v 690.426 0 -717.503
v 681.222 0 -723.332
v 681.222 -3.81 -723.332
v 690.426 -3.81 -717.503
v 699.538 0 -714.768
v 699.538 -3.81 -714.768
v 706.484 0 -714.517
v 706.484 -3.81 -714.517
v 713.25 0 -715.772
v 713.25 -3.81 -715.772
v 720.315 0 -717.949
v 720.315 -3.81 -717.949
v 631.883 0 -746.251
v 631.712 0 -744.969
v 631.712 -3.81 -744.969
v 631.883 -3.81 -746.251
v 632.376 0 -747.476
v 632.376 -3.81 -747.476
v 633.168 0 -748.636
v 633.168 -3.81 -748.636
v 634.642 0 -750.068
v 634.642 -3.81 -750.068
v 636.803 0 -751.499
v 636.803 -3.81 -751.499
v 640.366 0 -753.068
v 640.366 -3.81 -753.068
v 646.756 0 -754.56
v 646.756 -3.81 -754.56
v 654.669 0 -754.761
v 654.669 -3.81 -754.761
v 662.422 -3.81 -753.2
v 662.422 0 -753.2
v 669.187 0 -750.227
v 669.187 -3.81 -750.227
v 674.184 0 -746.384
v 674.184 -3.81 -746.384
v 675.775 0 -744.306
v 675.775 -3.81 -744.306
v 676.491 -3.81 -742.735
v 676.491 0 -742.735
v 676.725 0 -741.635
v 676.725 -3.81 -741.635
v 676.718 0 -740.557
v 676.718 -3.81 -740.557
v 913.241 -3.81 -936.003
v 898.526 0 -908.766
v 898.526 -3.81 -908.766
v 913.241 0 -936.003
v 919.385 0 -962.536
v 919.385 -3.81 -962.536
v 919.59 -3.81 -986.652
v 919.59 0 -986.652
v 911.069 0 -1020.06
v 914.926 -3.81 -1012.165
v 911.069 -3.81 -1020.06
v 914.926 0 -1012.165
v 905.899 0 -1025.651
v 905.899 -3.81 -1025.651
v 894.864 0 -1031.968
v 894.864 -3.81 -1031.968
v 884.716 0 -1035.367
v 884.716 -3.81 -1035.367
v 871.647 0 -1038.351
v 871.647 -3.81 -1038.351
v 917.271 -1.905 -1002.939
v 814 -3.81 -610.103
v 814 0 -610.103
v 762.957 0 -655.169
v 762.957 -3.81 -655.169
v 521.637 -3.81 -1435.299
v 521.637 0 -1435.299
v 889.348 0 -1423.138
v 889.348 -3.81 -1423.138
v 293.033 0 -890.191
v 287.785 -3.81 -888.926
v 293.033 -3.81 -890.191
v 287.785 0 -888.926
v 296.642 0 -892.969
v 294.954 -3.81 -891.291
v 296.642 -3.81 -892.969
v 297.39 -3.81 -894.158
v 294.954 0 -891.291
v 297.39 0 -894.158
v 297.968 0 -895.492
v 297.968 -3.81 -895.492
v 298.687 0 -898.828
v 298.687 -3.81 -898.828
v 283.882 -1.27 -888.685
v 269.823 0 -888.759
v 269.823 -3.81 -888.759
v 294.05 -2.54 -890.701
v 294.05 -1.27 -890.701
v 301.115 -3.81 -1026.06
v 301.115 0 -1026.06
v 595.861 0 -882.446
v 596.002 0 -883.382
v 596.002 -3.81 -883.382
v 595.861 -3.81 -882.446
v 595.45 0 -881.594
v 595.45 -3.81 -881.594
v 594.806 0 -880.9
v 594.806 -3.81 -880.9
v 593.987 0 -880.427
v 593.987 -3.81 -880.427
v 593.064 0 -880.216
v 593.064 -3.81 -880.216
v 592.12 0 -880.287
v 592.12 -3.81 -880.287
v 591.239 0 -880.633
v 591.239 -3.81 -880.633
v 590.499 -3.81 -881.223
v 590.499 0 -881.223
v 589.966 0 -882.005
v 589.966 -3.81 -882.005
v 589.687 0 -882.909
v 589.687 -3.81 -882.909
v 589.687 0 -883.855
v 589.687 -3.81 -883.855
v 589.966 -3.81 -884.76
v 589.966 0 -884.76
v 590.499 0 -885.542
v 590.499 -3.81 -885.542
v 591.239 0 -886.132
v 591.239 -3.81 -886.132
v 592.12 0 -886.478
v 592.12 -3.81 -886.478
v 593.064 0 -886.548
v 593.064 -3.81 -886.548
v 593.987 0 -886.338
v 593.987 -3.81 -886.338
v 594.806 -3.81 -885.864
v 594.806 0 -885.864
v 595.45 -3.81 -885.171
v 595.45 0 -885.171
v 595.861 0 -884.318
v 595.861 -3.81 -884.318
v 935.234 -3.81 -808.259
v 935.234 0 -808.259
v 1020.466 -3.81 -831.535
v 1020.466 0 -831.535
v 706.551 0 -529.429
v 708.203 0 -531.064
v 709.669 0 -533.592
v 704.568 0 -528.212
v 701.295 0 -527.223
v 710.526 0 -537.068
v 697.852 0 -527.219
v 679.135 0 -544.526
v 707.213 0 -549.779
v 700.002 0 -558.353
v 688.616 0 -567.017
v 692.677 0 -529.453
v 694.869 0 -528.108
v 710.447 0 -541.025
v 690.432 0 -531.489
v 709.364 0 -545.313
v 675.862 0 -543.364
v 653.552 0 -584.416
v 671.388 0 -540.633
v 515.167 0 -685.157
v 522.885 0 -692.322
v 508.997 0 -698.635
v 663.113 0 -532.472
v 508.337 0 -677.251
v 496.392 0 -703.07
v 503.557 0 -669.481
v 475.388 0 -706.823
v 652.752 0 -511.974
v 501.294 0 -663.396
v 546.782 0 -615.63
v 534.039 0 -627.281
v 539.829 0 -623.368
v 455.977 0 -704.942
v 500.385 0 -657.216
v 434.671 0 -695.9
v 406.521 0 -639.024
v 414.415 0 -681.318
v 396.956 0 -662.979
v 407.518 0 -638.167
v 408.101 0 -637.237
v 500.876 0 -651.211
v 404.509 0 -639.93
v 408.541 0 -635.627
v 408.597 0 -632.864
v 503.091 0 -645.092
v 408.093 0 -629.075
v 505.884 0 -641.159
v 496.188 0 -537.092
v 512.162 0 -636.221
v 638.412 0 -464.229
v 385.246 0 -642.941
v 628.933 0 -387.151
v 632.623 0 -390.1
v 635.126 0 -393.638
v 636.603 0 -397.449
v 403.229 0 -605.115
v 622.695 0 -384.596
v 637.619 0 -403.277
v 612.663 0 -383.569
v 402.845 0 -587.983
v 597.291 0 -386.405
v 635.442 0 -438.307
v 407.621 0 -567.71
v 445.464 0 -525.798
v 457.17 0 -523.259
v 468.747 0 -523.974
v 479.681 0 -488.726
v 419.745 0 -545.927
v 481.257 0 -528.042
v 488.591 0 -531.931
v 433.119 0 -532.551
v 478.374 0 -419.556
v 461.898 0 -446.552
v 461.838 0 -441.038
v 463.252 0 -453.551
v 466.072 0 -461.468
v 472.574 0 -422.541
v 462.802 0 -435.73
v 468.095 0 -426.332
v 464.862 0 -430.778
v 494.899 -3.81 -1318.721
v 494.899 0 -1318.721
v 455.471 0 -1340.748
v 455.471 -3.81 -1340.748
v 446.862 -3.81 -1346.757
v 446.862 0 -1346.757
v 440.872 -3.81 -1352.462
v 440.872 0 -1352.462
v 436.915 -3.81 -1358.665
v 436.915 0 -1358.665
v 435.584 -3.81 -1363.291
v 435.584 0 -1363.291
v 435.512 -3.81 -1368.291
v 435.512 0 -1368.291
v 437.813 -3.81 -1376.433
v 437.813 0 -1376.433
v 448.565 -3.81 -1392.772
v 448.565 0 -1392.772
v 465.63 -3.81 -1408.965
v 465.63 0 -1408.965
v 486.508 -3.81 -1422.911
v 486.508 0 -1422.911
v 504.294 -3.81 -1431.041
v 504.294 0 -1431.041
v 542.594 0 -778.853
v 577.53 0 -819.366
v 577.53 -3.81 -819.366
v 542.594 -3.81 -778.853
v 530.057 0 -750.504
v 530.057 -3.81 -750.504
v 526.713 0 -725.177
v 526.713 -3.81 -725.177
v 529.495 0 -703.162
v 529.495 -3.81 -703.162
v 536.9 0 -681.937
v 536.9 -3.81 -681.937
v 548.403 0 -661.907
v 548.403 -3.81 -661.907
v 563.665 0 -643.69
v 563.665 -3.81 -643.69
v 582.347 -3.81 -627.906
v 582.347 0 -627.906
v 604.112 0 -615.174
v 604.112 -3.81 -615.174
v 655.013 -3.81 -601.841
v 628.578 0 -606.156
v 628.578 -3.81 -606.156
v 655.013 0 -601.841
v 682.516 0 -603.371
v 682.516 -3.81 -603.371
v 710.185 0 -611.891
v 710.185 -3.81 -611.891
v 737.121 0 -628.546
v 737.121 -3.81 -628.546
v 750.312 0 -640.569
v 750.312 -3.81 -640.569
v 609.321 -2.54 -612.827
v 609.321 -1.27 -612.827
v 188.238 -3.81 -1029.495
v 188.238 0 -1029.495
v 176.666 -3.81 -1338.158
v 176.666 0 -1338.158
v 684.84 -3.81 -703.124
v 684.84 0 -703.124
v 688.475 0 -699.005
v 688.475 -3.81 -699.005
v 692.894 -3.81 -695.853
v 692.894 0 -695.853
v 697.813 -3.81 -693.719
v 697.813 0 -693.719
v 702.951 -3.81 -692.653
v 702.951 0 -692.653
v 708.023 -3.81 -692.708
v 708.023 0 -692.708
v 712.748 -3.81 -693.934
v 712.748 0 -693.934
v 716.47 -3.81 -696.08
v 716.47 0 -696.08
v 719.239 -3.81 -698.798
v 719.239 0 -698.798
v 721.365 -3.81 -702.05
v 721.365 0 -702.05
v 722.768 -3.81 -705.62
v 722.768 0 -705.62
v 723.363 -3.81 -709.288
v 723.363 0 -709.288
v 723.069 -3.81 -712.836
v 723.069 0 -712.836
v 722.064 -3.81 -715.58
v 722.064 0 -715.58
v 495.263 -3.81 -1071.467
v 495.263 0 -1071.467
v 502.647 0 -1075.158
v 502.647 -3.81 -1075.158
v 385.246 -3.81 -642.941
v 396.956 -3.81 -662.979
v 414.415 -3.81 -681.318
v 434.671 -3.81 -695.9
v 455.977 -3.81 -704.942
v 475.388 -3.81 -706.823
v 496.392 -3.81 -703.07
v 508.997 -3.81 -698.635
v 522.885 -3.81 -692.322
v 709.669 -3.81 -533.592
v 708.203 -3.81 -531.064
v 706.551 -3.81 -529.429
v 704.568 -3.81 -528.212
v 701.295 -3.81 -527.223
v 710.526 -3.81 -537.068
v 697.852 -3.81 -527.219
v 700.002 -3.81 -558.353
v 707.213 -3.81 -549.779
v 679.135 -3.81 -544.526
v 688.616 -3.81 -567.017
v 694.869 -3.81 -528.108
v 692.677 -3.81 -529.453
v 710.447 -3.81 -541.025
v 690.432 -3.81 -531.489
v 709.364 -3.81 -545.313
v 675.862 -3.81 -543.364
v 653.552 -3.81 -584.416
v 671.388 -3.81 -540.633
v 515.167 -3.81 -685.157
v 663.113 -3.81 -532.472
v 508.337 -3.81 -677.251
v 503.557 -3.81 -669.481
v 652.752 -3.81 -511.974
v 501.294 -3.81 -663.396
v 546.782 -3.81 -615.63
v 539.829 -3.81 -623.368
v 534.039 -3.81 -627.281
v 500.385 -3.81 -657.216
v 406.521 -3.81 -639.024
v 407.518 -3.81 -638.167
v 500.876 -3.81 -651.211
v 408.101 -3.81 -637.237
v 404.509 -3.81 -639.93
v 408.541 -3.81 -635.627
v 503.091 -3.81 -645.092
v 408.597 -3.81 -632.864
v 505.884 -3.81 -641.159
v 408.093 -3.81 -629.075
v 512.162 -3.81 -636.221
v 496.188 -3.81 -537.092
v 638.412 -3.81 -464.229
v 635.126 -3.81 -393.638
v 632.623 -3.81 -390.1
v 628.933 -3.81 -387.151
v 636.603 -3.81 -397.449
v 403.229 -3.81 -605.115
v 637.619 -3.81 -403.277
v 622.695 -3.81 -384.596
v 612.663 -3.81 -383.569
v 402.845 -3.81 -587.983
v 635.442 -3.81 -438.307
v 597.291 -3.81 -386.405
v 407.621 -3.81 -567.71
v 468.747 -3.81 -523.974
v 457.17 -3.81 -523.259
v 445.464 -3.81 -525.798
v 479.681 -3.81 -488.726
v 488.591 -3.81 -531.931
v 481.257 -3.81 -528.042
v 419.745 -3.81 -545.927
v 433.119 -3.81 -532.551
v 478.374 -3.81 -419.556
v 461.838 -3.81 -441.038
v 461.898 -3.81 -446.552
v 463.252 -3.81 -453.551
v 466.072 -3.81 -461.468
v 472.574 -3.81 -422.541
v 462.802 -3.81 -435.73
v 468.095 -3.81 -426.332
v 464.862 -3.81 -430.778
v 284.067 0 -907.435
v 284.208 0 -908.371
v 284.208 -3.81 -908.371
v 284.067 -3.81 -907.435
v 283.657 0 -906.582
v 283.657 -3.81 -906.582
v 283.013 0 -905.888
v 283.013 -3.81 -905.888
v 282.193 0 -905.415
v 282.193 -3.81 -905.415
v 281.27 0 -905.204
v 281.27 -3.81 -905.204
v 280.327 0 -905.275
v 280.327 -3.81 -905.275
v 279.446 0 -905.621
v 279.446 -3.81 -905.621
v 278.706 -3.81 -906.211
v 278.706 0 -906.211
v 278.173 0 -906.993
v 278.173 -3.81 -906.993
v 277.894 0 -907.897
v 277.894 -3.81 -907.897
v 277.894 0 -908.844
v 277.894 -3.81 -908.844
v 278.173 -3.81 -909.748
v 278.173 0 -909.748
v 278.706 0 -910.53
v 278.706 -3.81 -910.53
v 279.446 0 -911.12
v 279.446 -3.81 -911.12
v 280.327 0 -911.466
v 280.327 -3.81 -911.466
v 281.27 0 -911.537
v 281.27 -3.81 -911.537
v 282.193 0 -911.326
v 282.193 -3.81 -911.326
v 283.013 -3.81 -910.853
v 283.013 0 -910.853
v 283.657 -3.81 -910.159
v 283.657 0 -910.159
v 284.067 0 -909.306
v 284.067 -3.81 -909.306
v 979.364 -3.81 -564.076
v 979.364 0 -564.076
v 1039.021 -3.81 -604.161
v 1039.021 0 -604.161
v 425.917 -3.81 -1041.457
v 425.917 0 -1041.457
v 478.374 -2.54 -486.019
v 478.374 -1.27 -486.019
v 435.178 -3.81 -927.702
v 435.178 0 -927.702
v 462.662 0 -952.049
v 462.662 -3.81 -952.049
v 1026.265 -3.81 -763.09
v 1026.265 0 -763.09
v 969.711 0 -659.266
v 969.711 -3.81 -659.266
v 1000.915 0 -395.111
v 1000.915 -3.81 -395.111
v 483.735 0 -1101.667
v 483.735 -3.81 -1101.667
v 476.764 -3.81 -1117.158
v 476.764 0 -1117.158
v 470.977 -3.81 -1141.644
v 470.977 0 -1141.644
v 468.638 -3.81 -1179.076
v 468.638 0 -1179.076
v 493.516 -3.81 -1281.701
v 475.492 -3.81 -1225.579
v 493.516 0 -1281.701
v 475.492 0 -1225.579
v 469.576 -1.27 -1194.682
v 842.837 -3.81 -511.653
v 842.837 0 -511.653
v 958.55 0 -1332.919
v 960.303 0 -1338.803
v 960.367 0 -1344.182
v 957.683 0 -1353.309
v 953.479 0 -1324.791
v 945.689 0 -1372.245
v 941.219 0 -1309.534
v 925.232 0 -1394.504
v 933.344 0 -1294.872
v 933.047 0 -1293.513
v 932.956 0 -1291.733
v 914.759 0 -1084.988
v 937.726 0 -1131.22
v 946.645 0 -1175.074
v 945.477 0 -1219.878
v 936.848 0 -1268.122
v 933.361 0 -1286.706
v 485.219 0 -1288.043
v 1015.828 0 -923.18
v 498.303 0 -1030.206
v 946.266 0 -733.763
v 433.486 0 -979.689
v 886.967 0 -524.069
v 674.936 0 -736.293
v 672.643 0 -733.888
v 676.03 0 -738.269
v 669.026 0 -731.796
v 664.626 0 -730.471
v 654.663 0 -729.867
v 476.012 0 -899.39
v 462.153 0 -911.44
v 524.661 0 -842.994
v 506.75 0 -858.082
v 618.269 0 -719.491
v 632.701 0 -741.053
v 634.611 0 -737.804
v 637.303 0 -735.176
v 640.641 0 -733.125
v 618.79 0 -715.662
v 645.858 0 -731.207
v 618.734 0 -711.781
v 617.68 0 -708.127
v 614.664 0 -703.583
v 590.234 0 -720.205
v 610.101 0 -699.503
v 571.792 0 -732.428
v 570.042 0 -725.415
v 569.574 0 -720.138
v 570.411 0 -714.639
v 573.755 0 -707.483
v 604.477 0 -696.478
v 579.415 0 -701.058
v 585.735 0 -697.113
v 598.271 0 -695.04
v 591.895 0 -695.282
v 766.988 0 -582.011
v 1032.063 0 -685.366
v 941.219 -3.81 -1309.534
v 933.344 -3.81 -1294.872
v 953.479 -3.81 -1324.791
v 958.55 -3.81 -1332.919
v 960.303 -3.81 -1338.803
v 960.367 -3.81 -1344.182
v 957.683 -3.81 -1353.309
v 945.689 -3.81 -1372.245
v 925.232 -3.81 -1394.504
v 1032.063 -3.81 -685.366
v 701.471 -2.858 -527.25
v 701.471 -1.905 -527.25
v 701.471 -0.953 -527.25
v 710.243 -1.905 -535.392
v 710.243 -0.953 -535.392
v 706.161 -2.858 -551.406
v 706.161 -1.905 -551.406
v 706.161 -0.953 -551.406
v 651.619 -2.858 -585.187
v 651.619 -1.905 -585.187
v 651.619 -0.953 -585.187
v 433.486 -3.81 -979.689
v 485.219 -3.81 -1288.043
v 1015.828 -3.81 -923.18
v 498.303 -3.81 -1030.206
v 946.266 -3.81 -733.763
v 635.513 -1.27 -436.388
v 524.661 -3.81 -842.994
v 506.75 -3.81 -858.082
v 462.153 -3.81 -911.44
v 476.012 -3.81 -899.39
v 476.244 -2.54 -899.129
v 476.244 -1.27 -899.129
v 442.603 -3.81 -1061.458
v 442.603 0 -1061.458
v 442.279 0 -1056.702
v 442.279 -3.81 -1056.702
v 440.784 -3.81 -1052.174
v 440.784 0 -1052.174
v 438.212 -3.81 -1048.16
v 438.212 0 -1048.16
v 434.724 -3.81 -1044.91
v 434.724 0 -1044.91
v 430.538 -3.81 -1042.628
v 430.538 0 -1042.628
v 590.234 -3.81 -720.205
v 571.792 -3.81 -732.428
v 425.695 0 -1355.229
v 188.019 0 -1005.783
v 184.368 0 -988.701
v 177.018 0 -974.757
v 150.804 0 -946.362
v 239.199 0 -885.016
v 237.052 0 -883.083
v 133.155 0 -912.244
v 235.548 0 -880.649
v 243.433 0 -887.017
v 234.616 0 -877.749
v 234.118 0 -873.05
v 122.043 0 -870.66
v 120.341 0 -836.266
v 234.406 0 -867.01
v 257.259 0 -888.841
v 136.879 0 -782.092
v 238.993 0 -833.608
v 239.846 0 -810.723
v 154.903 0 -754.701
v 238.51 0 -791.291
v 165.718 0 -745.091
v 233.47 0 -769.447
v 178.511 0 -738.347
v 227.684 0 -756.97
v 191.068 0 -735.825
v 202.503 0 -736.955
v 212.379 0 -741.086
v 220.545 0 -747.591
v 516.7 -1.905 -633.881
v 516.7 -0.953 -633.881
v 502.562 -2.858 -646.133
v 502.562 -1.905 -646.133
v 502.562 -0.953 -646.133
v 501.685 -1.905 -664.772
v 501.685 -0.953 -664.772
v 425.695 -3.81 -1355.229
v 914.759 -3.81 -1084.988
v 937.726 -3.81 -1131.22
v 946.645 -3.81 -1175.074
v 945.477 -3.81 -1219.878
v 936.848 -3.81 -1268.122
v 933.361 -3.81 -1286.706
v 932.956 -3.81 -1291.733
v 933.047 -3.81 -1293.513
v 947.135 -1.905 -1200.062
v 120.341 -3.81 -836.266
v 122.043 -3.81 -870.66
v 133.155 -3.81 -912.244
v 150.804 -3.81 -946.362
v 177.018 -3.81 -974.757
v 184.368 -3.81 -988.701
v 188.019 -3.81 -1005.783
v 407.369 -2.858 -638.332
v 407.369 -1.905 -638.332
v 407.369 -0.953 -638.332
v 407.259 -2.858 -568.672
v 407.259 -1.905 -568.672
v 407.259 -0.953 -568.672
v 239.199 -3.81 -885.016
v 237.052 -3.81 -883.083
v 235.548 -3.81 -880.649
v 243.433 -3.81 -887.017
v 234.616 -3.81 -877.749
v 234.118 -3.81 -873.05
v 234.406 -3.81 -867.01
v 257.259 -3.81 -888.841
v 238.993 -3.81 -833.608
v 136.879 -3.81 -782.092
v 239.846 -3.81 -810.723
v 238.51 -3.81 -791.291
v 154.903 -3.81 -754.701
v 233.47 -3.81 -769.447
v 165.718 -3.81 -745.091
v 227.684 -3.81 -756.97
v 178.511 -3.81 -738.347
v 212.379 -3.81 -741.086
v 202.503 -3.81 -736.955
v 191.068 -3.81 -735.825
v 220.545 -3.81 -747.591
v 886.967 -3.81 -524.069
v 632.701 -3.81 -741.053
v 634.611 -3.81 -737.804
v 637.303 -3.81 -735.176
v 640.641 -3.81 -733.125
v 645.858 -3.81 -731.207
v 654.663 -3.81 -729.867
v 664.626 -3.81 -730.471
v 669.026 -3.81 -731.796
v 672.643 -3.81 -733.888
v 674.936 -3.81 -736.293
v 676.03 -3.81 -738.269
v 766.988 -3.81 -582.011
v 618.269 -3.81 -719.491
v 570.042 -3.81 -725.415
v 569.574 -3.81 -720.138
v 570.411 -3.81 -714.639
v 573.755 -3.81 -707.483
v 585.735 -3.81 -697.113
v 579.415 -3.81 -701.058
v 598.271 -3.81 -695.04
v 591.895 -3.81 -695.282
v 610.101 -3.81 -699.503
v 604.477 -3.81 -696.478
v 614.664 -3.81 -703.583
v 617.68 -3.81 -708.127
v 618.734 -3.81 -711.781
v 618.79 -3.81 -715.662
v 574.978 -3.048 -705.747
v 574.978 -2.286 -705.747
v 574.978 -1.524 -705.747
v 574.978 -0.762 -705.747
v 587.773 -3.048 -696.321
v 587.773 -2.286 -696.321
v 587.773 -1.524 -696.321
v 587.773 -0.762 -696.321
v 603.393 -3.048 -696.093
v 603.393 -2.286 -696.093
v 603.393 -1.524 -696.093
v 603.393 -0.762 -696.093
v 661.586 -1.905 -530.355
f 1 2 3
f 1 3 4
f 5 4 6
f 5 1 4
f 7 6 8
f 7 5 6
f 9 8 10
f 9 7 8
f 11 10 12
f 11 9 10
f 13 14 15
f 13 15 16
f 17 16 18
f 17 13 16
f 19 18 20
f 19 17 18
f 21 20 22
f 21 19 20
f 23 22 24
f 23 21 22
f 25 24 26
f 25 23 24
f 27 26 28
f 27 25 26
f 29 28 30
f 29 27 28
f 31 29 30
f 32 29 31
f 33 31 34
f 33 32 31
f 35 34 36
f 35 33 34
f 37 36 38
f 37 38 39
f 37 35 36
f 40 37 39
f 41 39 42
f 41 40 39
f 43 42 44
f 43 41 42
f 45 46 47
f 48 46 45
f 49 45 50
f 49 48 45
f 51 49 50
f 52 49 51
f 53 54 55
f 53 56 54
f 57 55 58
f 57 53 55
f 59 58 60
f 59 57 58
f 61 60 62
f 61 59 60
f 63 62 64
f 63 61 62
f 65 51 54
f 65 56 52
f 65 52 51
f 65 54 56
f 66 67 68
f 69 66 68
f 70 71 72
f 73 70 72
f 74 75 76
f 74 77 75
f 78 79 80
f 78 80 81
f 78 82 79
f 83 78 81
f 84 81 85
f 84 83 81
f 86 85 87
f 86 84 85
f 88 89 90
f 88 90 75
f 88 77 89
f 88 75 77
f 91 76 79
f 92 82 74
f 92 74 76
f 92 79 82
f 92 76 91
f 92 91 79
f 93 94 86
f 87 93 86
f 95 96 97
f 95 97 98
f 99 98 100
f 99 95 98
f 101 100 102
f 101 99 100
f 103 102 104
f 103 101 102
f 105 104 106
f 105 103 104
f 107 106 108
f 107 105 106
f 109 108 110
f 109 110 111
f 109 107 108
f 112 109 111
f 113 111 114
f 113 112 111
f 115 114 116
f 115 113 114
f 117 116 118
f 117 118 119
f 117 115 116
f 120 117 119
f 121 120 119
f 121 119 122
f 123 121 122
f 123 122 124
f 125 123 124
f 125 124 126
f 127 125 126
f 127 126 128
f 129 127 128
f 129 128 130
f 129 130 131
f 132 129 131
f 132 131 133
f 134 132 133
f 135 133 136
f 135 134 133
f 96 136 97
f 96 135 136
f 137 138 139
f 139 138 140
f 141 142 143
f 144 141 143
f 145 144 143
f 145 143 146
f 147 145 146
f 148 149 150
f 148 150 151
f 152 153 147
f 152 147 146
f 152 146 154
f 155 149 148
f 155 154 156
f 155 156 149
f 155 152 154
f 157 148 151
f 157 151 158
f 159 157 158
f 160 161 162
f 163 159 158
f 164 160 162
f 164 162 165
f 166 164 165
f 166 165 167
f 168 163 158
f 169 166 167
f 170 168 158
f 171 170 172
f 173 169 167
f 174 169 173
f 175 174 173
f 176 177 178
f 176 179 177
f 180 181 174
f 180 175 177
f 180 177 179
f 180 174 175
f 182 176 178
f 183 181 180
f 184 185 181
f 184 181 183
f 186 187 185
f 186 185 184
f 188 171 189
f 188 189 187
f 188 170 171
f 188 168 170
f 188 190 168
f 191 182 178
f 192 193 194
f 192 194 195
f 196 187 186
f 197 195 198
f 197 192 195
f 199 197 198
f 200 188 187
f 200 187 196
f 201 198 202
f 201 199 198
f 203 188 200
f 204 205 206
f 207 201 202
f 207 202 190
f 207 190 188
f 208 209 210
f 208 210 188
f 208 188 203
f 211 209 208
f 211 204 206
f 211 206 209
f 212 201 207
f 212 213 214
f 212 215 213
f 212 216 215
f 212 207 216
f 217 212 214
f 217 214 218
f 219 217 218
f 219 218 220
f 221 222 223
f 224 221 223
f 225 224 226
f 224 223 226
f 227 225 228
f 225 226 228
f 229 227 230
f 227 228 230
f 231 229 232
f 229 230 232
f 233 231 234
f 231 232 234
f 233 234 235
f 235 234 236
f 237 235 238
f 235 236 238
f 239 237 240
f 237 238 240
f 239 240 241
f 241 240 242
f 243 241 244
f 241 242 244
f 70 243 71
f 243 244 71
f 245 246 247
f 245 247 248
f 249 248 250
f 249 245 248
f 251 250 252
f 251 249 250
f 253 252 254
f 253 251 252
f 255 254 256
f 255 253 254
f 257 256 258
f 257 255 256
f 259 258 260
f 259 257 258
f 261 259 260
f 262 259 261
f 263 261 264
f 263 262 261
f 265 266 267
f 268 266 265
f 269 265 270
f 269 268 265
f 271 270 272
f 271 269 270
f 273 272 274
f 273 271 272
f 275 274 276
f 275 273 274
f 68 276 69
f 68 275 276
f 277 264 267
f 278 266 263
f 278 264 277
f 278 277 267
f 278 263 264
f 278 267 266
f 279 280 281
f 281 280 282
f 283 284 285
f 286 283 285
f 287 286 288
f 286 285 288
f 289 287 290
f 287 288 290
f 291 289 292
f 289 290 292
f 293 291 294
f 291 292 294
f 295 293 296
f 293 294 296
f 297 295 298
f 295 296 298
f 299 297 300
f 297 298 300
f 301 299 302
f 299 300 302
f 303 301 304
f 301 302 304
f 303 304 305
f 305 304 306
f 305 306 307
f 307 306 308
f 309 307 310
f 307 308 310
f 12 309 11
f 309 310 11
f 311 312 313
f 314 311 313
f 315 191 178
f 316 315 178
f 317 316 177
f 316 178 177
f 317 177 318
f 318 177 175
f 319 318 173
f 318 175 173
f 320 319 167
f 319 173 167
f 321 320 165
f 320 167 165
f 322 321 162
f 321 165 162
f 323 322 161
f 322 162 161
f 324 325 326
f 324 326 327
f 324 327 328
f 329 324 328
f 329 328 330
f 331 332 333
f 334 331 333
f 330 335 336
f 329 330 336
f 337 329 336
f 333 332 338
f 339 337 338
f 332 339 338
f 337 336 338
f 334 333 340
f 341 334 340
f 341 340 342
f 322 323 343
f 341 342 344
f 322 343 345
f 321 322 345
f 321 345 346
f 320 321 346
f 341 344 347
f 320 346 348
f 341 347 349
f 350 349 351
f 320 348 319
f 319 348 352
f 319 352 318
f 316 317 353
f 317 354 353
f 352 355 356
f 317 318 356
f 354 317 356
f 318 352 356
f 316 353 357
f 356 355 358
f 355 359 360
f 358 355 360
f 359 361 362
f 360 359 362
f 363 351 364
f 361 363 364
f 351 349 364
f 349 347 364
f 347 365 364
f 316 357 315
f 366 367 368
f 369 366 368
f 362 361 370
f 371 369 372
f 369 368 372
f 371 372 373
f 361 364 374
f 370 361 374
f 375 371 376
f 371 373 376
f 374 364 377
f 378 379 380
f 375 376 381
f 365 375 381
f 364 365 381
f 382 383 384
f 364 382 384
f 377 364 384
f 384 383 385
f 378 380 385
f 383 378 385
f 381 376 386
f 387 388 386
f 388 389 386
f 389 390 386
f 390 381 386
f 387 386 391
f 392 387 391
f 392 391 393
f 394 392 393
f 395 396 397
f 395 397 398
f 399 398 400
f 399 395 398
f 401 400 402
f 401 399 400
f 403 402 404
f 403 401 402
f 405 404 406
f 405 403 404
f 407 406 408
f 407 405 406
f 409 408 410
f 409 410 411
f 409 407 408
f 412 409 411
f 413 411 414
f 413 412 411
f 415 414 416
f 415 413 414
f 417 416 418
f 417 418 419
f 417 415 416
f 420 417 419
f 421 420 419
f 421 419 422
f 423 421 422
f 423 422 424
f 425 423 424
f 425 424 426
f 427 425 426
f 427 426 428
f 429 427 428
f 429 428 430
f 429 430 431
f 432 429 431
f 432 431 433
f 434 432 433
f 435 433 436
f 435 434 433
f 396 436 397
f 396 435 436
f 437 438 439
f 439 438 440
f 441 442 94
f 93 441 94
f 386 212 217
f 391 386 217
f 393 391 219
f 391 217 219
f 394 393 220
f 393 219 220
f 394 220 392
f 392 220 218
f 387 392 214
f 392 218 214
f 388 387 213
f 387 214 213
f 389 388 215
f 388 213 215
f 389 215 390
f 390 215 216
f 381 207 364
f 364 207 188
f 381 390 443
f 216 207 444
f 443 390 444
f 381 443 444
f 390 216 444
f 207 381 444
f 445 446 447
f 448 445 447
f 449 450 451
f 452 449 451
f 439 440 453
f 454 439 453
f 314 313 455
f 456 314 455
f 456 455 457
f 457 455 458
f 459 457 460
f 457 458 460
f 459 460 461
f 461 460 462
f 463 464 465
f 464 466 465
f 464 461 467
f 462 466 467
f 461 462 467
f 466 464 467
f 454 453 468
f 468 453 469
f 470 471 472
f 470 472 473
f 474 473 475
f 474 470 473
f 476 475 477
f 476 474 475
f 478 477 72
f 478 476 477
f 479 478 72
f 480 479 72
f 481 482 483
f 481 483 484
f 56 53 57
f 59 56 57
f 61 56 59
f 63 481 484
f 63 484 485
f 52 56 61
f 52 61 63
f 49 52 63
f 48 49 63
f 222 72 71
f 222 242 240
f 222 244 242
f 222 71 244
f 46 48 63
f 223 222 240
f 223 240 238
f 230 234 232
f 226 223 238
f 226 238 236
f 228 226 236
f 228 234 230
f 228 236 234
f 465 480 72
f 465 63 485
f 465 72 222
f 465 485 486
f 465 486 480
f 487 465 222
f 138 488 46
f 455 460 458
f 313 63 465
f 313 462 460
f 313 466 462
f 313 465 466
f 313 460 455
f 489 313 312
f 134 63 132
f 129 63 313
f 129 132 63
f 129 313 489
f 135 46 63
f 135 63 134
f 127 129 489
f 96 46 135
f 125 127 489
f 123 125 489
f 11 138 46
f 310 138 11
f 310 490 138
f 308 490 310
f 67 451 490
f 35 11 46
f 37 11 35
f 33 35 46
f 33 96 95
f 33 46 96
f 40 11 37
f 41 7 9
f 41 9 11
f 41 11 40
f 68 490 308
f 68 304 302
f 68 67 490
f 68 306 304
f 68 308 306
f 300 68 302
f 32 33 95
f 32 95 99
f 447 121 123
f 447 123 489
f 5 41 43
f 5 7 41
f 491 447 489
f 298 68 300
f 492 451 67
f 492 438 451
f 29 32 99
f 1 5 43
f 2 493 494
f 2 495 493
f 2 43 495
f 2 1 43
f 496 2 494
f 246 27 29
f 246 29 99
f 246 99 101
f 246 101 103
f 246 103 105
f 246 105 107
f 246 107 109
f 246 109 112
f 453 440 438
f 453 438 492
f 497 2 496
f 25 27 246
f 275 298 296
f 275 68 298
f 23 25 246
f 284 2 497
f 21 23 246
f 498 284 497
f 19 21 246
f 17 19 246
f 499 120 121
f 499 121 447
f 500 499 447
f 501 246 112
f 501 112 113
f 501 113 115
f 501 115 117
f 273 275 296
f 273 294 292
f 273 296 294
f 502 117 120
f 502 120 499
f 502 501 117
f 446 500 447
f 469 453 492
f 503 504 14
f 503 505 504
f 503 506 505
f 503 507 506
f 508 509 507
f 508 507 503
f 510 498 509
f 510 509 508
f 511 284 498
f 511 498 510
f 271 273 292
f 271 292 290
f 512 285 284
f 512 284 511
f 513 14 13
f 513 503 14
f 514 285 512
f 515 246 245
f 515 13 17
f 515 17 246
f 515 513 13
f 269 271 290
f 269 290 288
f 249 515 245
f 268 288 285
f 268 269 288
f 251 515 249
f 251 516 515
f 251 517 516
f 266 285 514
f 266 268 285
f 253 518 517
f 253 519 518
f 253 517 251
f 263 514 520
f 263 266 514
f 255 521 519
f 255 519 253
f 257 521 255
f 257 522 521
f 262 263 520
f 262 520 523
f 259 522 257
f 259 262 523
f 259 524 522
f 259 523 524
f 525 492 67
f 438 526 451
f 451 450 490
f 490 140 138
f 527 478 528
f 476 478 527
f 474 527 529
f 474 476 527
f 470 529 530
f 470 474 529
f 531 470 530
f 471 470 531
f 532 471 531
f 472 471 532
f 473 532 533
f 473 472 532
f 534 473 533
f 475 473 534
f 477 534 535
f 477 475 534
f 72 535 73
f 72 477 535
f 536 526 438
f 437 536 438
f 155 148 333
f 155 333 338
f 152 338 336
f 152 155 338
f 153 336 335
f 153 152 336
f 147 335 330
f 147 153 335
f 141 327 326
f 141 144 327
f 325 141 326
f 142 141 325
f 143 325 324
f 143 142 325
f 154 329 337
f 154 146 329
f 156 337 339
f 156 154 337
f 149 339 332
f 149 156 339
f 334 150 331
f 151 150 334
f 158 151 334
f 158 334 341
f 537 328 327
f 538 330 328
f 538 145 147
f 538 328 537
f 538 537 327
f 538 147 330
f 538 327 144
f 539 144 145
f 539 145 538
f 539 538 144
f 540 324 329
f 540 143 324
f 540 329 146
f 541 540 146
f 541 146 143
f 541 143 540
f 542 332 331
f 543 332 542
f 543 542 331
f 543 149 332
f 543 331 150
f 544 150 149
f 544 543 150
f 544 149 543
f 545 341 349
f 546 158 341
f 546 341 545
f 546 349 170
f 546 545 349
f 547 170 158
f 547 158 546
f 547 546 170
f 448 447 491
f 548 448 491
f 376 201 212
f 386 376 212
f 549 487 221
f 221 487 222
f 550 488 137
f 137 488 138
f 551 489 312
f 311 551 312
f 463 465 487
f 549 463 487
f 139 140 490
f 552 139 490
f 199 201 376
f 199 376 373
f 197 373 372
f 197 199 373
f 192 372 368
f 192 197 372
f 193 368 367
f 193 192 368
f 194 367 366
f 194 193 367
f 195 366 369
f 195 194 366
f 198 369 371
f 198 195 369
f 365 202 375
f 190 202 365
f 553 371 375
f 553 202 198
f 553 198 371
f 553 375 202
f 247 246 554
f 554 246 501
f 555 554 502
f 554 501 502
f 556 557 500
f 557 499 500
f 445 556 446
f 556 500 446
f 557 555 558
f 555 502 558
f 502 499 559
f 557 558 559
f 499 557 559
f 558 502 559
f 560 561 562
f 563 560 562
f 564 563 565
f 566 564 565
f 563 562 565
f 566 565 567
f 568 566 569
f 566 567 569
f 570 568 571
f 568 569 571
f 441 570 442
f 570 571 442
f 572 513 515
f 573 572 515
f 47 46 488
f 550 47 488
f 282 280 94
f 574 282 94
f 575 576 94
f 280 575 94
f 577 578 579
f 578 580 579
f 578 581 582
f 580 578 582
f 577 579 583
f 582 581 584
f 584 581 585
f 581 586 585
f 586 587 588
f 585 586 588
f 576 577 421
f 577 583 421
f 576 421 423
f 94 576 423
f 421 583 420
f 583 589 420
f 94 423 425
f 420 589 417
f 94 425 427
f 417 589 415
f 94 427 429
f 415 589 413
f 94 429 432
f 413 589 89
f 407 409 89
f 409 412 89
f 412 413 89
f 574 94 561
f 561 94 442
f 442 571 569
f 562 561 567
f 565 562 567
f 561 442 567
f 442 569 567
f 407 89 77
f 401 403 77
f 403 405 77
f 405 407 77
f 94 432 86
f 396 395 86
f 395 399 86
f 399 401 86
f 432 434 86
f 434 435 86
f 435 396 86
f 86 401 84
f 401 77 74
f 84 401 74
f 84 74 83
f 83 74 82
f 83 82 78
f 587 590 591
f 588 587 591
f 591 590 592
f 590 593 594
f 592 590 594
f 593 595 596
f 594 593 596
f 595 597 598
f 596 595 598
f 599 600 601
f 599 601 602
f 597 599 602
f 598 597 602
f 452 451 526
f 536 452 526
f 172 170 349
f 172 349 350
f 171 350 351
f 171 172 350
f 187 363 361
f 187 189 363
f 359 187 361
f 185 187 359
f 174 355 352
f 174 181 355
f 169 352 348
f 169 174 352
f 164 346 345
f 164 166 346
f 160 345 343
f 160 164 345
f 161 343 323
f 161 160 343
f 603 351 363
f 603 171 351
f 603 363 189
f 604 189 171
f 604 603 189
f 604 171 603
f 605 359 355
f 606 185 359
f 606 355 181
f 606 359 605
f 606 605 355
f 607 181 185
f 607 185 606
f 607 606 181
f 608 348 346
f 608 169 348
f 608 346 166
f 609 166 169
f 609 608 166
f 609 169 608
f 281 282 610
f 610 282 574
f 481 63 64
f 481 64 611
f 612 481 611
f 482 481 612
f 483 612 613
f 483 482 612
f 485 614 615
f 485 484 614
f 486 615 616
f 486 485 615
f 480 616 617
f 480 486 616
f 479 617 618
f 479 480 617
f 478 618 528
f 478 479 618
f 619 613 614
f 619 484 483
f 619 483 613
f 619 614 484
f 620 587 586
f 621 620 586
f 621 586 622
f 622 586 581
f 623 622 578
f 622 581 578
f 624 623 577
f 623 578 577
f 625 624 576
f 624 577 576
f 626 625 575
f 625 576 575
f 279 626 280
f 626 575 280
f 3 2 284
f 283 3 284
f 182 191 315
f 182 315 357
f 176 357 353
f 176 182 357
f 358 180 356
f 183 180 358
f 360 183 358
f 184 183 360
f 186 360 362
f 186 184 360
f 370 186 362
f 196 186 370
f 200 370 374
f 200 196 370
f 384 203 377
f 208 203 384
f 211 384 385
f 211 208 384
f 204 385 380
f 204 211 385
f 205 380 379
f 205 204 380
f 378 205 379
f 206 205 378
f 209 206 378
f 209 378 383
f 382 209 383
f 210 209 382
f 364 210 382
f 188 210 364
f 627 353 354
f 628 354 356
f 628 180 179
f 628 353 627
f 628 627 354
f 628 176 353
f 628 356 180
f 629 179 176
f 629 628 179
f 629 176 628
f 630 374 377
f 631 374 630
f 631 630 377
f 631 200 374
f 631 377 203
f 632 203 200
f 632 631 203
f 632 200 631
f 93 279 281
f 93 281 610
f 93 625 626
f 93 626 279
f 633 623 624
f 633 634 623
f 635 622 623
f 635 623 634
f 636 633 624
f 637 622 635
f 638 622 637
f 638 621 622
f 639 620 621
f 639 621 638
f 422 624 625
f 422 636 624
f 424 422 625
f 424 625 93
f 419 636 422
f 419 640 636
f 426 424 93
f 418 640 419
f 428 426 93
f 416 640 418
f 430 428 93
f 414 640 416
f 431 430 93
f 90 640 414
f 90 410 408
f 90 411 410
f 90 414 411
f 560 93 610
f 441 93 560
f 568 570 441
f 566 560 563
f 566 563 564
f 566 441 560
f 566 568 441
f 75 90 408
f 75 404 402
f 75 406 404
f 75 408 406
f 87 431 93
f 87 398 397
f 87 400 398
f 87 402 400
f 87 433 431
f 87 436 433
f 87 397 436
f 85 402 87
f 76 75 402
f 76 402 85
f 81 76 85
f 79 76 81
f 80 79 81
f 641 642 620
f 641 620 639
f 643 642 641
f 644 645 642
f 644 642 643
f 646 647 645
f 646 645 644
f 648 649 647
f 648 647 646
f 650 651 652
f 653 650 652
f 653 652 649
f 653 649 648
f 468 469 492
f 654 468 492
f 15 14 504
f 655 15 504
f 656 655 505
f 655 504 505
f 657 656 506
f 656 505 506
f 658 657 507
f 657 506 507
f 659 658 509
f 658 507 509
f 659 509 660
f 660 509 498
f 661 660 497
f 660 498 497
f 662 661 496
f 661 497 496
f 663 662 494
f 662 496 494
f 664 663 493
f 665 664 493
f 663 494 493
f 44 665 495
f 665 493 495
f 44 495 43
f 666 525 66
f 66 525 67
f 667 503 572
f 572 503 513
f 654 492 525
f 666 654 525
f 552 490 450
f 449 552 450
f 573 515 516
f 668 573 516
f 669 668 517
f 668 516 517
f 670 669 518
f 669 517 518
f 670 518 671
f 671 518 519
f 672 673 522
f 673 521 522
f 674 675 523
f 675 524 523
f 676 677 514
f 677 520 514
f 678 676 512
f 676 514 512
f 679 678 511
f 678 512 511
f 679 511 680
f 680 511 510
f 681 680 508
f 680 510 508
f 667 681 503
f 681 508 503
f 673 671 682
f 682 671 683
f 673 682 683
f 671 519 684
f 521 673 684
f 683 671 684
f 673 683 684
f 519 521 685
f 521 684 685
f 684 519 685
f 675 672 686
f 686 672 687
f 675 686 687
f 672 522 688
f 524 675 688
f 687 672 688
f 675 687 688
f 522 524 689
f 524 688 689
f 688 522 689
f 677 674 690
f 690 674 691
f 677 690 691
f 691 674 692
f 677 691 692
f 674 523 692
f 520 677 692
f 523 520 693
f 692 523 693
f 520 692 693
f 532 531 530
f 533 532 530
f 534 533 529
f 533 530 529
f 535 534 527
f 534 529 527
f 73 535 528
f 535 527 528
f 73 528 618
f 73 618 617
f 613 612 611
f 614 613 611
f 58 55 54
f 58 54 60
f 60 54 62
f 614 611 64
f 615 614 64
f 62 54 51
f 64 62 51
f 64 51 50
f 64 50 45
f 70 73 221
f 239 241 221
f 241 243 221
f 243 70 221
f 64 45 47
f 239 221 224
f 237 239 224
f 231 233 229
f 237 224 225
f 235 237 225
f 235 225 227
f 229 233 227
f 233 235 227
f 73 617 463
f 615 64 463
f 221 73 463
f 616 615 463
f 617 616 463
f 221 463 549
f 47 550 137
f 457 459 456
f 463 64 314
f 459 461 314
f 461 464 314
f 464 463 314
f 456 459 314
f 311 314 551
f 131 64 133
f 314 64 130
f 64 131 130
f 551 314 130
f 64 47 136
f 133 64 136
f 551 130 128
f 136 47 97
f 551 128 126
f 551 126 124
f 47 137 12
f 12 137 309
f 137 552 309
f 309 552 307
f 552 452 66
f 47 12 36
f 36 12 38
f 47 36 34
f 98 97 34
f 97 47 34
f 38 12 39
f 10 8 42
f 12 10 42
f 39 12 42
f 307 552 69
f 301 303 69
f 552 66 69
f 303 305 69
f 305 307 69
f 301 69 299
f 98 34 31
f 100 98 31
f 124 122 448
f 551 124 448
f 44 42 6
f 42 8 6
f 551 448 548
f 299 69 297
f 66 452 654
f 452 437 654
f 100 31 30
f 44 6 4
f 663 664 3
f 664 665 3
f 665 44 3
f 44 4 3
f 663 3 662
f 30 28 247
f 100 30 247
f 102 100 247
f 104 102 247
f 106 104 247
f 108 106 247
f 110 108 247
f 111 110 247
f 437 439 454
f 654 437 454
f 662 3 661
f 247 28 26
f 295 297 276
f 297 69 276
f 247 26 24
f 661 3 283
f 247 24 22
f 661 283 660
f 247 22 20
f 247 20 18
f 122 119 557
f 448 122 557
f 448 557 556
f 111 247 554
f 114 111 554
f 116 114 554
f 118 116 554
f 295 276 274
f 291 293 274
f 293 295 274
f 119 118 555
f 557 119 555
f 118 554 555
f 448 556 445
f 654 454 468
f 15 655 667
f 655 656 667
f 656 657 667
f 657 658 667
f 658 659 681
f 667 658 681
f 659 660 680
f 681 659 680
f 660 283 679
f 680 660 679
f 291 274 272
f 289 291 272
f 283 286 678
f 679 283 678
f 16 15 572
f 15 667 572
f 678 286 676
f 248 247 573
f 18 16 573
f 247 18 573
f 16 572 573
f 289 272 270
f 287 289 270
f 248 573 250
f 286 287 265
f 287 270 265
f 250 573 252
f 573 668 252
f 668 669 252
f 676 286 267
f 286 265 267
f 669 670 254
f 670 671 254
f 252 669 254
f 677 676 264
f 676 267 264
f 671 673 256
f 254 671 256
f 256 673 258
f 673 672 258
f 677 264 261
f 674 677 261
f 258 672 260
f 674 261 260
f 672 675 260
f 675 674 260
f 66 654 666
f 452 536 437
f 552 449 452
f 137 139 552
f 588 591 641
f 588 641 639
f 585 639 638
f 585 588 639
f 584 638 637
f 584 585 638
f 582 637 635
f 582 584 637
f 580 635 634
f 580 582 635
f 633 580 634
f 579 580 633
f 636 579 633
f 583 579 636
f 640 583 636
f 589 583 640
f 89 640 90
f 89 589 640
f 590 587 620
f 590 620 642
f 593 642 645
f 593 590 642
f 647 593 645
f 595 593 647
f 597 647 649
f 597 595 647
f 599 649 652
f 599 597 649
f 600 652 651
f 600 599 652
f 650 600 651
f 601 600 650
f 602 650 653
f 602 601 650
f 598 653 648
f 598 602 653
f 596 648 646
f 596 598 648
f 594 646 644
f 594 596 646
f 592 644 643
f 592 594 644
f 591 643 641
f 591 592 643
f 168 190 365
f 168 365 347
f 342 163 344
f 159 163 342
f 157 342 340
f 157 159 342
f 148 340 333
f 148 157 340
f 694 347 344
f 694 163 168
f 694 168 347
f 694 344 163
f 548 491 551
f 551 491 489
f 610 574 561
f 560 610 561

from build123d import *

# Parameters (mm, degrees)
F0_R     = 3.175
F1_DEPTH = 3.81
F2_DEPTH = 3.81
F3_DEPTH = 3.81


with BuildPart() as f1:
    # F0 (on Front) → F1 (new body)
    with BuildSketch(Plane.XZ):
        with BuildLine():
            add(Edge.make_bspline(
                [(577.5301456451, -819.3663954735), (528.1828455236, -775.2097354619), (511.8682646711, -695.7693412774), (603.6466815031, -591.7203471431), (716.3102957828, -594.8701009791), (762.9569310114, -655.1693814075)],
                knots=[0, 0, 0, 0, 0.3293668885, 0.637001862, 1, 1, 1, 1], degree=3))
            add(Edge.make_bspline(
                [(577.5301456451, -819.3663954735), (548.4415590763, -828.8691043854), (505.7238427203, -848.2158835695), (478.3801648961, -904.3760548657), (454.5234614416, -916.3610723098), (435.1778030396, -927.7024269104)],
                knots=[0, 0, 0, 0, 0.3789939307, 0.6958266706, 1, 1, 1, 1], degree=3))
            Line((435.1778030396, -927.7024269104), (462.6617431641, -952.0492553711))
            Line((462.6617431641, -952.0492553711), (433.4862232208, -979.689180851))
            Line((433.4862232208, -979.689180851), (498.3033835888, -1030.20632267))
            Line((498.3033835888, -1030.20632267), (495.2631294727, -1071.4668035507))
            Line((495.2631294727, -1071.4668035507), (502.6465654373, -1075.1584768295))
            add(Edge.make_bspline(
                [(502.6465654373, -1075.1584768295), (488.6894524097, -1092.4161672592), (470.9415864608, -1117.8422471962), (464.9083709305, -1202.6021949076), (480.424195528, -1241.6837215424), (493.5157001019, -1281.7008495331)],
                knots=[0, 0, 0, 0, 0.2896237354, 0.6260496393, 1, 1, 1, 1], degree=3))
            Line((493.5157001019, -1281.7008495331), (485.2193295956, -1288.0431413651))
            Line((485.2193295956, -1288.0431413651), (494.8991835117, -1318.7214136124))
            add(Edge.make_bspline(
                [(494.8991835117, -1318.7214136124), (465.0806188583, -1336.5308046341), (396.7716459328, -1359.252285007), (485.4855239391, -1431.0497045517), (521.6368436813, -1435.2991580963)],
                knots=[0, 0, 0, 0, 0.4556345052, 1, 1, 1, 1], degree=3))
            Line((521.6368436813, -1435.2991580963), (889.3482685089, -1423.1382608414))
            add(Edge.make_bspline(
                [(933.3438873291, -1294.8722839355), (941.4881642767, -1317.7783897819), (992.6141344167, -1338.4569526546), (906.9065451622, -1413.454413414), (889.3482685089, -1423.1382608414)],
                knots=[0, 0, 0, 0, 0.4234968758, 1, 1, 1, 1], degree=3))
            add(Edge.make_bspline(
                [(871.6471791267, -1038.3514165878), (927.4149873158, -1084.2346286341), (965.7941767446, -1183.490102748), (930.3771163262, -1286.5281213963), (933.3438873291, -1294.8722839355)],
                knots=[0, 0, 0, 0, 0.5771320349, 1, 1, 1, 1], degree=3))
            add(Edge.make_bspline(
                [(898.52643013, -908.7656140327), (923.6634969711, -942.9339766502), (920.5779555974, -1007.8859988599), (908.2981348038, -1031.3572883606), (871.6471791267, -1038.3514165878)],
                knots=[0, 0, 0, 0, 0.5632045881, 1, 1, 1, 1], degree=3))
            Line((898.52643013, -908.7656140327), (1015.8278942108, -923.1802821159))
            Line((1015.8278942108, -923.1802821159), (935.2338910103, -808.2593679428))
            Line((935.2338910103, -808.2593679428), (1020.4664468765, -831.5346837044))
            Line((1020.4664468765, -831.5346837044), (946.266412735, -733.7628602982))
            Line((946.266412735, -733.7628602982), (1026.2647867203, -763.0904912949))
            Line((1026.2647867203, -763.0904912949), (969.7105288506, -659.2663526535))
            Line((969.7105288506, -659.2663526535), (1032.0630073547, -685.3656768799))
            Line((1032.0630073547, -685.3656768799), (979.3639779091, -564.0763640404))
            Line((979.3639779091, -564.0763640404), (1039.0208959579, -604.1606664658))
            Line((1039.0208959579, -604.1606664658), (1000.9149312973, -395.1109349728))
            Line((1000.9149312973, -395.1109349728), (842.8366184235, -511.6528868675))
            Line((842.8366184235, -511.6528868675), (886.9666457176, -524.0690112114))
            Line((886.9666457176, -524.0690112114), (766.9880390167, -582.0107460022))
            Line((766.9880390167, -582.0107460022), (813.9998316765, -610.1028323174))
            Line((813.9998316765, -610.1028323174), (762.9569310114, -655.1693814075))
        make_face()
        with Locations((592.8269028664, -883.3821415901)):
            Circle(F0_R, mode=Mode.SUBTRACT)
        with BuildLine():
            Line((590.2343392372, -720.2050685883), (571.7921853065, -732.428252697))
            add(Edge.make_bspline(
                [(571.7921853065, -732.428252697), (570.3371483959, -727.3156040261), (567.2004990612, -716.2941749928), (580.2634803929, -696.2532951535), (603.8850913859, -692.6030162823), (620.1884561261, -707.6096414004), (618.8467900169, -715.9149686406), (618.2691454887, -719.4907665253)],
                knots=[0, 0, 0, 0, 0.1904069281, 0.410463652, 0.6330720336, 0.8420218484, 1, 1, 1, 1], degree=3))
            Line((618.2691454887, -719.4907665253), (590.2343392372, -720.2050685883))
        make_face(mode=Mode.SUBTRACT)
        with BuildLine():
            add(Edge.make_bspline(
                [(631.7122578621, -744.9688911438), (631.7122578621, -751.3226270676), (656.3804391973, -760.548485088), (677.4371511594, -746.3113254518), (676.7178177834, -740.5565977097)],
                knots=[0, 0, 0, 0, 0.5013378355, 1, 1, 1, 1], degree=3))
            add(Edge.make_bspline(
                [(631.7122578621, -744.9688911438), (632.841887737, -734.9903031643), (652.3922938692, -726.7663940261), (674.9528646469, -731.3789725304), (676.7178177834, -740.5565977097)],
                knots=[0, 0, 0, 0, 0.5023619674, 1, 1, 1, 1], degree=3))
        make_face(mode=Mode.SUBTRACT)
        with BuildLine():
            add(Edge.make_bspline(
                [(681.2216639519, -723.332464695), (688.6807384257, -717.0855008441), (703.6885591516, -712.3479853933), (714.3269764947, -716.0198047743), (720.31468153, -717.949450016)],
                knots=[0, 0, 0, 0, 0.544327007, 1, 1, 1, 1], degree=3))
            Line((681.2216639519, -723.332464695), (684.8397254944, -703.1241059303))
            add(Edge.make_bspline(
                [(684.8397254944, -703.1241059303), (691.8112039566, -692.9758191109), (719.2801227268, -686.6265137394), (726.2271642685, -712.0369672775), (720.31468153, -717.949450016)],
                knots=[0, 0, 0, 0, 0.5390144085, 1, 1, 1, 1], degree=3))
        make_face(mode=Mode.SUBTRACT)
    extrude(amount=F1_DEPTH)


with BuildPart() as f2:
    # F0 (on Front) → F2 (new body, through all)
    with BuildSketch(Plane.XZ):
        with BuildLine():
            Line((188.2380843163, -1029.4947624207), (176.6659766436, -1338.1580114365))
            Line((176.6659766436, -1338.1580114365), (425.694912672, -1355.2285432816))
            Line((425.694912672, -1355.2285432816), (442.6029569468, -1061.4581481235))
            ThreePointArc((442.6029569468, -1061.4581481235), (438.2124855151, -1048.1601490776), (425.9169932078, -1041.456874733))
            Line((425.9169932078, -1041.456874733), (301.1150658131, -1026.0597467422))
            Line((301.1150658131, -1026.0597467422), (298.6874580383, -898.8275527954))
            add(Edge.make_bspline(
                [(269.8233425617, -888.7588381767), (285.2829094871, -888.9815762485), (297.359675169, -886.3037824631), (298.6874580383, -898.8275527954)],
                knots=[0, 0, 0, 0, 30.569857316, 30.569857316, 30.569857316, 30.569857316], degree=3))
            add(Edge.make_bspline(
                [(238.992869854, -833.6080908775), (237.5793856275, -855.514381618), (223.0315504622, -892.3171920893), (261.6593160165, -888.6412126611), (269.8233425617, -888.7588381767)],
                knots=[0, 0, 0, 0, 0.5548061955, 1, 1, 1, 1], degree=3))
            add(Edge.make_bspline(
                [(120.3411370516, -836.2656235695), (130.1100999117, -780.3901433945), (177.704587178, -707.7777298713), (245.721578598, -752.2519230843), (238.992869854, -833.6080908775)],
                knots=[0, 0, 0, 0, 0.5069311132, 1, 1, 1, 1], degree=3))
            add(Edge.make_bspline(
                [(120.3411370516, -836.2656235695), (116.6526824236, -861.7463707924), (141.5753776599, -967.9110663), (191.9240802526, -971.8928337097), (188.2380843163, -1029.4947624207)],
                knots=[0, 0, 0, 0, 0.5240361773, 1, 1, 1, 1], degree=3))
        make_face()
        with Locations((281.033217907, -908.3706140518)):
            Circle(F0_R, mode=Mode.SUBTRACT)
    extrude(amount=F2_DEPTH)


with BuildPart() as f3:
    # F0 (on Front) → F3 (new body, through all)
    with BuildSketch(Plane.XZ):
        with BuildLine():
            add(Edge.make_bspline(
                [(679.1345477104, -544.5263981819), (685.6102347374, -538.8447642326), (691.8369083522, -524.7143048759), (711.5607431566, -528.4281101081), (712.1838470594, -566.1055607905), (630.5016875267, -596.9364643097), (546.7824339867, -615.6299114227)],
                knots=[0, 0, 0, 0, 0.1829002389, 0.3226989396, 0.495471447, 1, 1, 1, 1], degree=3))
            add(Edge.make_bspline(
                [(638.4124159813, -464.2289578915), (644.5713807562, -482.0536816239), (653.8030748365, -532.0553291078), (675.8939623833, -543.9748167992), (679.1345477104, -544.5263981819)],
                knots=[0, 0, 0, 0, 0.6380082999, 1, 1, 1, 1], degree=3))
            add(Edge.make_bspline(
                [(597.2914099693, -386.4045143127), (612.5478863529, -381.3103679297), (645.3129339724, -384.6174029742), (632.446192358, -437.3401651359), (636.9505614508, -456.3789591398), (638.4124159813, -464.2289578915)],
                knots=[0, 0, 0, 0, 0.3392562745, 0.7070063482, 1, 1, 1, 1], degree=3))
            Line((597.2914099693, -386.4045143127), (478.3742129803, -419.5556182318))
            add(Edge.make_bspline(
                [(478.3742129803, -419.5556182318), (465.6175374985, -424.5383143425), (455.4714743401, -447.4592706966), (481.4218654099, -487.4176378948), (490.8986630412, -516.7832910175), (496.188223362, -537.0917320251)],
                knots=[0, 0, 0, 0, 0.2860951067, 0.6232047662, 1, 1, 1, 1], degree=3))
            add(Edge.make_bspline(
                [(385.2455615997, -642.9407596588), (402.6290316883, -640.673366181), (410.9874153651, -640.3434295813), (405.3568941361, -617.2884205486), (394.0607638221, -566.874646932), (450.376656239, -502.5577473745), (496.188223362, -537.0917320251)],
                knots=[0, 0, 0, 0, 0.1893788908, 0.3459015416, 0.62411614, 1, 1, 1, 1], degree=3))
            add(Edge.make_bspline(
                [(385.2455615997, -642.9407596588), (393.0871784687, -662.9540324211), (435.7935732461, -705.871909198), (481.3249111176, -713.128387928), (522.8850245476, -692.3216581345)],
                knots=[0, 0, 0, 0, 0.473668011, 1, 1, 1, 1], degree=3))
            add(Edge.make_bspline(
                [(546.7824339867, -615.6299114227), (539.304792881, -625.1639127731), (531.9757341713, -628.7575376013), (501.7486927929, -637.6879373636), (497.4332380951, -667.1145675628), (513.8134245426, -684.5658607872), (522.8850245476, -692.3216581345)],
                knots=[0, 0, 0, 0, 0.2276528799, 0.4761410512, 0.7141142056, 1, 1, 1, 1], degree=3))
        make_face()
    extrude(amount=F3_DEPTH)


solid = Compound([f1.part, f2.part, f3.part])
